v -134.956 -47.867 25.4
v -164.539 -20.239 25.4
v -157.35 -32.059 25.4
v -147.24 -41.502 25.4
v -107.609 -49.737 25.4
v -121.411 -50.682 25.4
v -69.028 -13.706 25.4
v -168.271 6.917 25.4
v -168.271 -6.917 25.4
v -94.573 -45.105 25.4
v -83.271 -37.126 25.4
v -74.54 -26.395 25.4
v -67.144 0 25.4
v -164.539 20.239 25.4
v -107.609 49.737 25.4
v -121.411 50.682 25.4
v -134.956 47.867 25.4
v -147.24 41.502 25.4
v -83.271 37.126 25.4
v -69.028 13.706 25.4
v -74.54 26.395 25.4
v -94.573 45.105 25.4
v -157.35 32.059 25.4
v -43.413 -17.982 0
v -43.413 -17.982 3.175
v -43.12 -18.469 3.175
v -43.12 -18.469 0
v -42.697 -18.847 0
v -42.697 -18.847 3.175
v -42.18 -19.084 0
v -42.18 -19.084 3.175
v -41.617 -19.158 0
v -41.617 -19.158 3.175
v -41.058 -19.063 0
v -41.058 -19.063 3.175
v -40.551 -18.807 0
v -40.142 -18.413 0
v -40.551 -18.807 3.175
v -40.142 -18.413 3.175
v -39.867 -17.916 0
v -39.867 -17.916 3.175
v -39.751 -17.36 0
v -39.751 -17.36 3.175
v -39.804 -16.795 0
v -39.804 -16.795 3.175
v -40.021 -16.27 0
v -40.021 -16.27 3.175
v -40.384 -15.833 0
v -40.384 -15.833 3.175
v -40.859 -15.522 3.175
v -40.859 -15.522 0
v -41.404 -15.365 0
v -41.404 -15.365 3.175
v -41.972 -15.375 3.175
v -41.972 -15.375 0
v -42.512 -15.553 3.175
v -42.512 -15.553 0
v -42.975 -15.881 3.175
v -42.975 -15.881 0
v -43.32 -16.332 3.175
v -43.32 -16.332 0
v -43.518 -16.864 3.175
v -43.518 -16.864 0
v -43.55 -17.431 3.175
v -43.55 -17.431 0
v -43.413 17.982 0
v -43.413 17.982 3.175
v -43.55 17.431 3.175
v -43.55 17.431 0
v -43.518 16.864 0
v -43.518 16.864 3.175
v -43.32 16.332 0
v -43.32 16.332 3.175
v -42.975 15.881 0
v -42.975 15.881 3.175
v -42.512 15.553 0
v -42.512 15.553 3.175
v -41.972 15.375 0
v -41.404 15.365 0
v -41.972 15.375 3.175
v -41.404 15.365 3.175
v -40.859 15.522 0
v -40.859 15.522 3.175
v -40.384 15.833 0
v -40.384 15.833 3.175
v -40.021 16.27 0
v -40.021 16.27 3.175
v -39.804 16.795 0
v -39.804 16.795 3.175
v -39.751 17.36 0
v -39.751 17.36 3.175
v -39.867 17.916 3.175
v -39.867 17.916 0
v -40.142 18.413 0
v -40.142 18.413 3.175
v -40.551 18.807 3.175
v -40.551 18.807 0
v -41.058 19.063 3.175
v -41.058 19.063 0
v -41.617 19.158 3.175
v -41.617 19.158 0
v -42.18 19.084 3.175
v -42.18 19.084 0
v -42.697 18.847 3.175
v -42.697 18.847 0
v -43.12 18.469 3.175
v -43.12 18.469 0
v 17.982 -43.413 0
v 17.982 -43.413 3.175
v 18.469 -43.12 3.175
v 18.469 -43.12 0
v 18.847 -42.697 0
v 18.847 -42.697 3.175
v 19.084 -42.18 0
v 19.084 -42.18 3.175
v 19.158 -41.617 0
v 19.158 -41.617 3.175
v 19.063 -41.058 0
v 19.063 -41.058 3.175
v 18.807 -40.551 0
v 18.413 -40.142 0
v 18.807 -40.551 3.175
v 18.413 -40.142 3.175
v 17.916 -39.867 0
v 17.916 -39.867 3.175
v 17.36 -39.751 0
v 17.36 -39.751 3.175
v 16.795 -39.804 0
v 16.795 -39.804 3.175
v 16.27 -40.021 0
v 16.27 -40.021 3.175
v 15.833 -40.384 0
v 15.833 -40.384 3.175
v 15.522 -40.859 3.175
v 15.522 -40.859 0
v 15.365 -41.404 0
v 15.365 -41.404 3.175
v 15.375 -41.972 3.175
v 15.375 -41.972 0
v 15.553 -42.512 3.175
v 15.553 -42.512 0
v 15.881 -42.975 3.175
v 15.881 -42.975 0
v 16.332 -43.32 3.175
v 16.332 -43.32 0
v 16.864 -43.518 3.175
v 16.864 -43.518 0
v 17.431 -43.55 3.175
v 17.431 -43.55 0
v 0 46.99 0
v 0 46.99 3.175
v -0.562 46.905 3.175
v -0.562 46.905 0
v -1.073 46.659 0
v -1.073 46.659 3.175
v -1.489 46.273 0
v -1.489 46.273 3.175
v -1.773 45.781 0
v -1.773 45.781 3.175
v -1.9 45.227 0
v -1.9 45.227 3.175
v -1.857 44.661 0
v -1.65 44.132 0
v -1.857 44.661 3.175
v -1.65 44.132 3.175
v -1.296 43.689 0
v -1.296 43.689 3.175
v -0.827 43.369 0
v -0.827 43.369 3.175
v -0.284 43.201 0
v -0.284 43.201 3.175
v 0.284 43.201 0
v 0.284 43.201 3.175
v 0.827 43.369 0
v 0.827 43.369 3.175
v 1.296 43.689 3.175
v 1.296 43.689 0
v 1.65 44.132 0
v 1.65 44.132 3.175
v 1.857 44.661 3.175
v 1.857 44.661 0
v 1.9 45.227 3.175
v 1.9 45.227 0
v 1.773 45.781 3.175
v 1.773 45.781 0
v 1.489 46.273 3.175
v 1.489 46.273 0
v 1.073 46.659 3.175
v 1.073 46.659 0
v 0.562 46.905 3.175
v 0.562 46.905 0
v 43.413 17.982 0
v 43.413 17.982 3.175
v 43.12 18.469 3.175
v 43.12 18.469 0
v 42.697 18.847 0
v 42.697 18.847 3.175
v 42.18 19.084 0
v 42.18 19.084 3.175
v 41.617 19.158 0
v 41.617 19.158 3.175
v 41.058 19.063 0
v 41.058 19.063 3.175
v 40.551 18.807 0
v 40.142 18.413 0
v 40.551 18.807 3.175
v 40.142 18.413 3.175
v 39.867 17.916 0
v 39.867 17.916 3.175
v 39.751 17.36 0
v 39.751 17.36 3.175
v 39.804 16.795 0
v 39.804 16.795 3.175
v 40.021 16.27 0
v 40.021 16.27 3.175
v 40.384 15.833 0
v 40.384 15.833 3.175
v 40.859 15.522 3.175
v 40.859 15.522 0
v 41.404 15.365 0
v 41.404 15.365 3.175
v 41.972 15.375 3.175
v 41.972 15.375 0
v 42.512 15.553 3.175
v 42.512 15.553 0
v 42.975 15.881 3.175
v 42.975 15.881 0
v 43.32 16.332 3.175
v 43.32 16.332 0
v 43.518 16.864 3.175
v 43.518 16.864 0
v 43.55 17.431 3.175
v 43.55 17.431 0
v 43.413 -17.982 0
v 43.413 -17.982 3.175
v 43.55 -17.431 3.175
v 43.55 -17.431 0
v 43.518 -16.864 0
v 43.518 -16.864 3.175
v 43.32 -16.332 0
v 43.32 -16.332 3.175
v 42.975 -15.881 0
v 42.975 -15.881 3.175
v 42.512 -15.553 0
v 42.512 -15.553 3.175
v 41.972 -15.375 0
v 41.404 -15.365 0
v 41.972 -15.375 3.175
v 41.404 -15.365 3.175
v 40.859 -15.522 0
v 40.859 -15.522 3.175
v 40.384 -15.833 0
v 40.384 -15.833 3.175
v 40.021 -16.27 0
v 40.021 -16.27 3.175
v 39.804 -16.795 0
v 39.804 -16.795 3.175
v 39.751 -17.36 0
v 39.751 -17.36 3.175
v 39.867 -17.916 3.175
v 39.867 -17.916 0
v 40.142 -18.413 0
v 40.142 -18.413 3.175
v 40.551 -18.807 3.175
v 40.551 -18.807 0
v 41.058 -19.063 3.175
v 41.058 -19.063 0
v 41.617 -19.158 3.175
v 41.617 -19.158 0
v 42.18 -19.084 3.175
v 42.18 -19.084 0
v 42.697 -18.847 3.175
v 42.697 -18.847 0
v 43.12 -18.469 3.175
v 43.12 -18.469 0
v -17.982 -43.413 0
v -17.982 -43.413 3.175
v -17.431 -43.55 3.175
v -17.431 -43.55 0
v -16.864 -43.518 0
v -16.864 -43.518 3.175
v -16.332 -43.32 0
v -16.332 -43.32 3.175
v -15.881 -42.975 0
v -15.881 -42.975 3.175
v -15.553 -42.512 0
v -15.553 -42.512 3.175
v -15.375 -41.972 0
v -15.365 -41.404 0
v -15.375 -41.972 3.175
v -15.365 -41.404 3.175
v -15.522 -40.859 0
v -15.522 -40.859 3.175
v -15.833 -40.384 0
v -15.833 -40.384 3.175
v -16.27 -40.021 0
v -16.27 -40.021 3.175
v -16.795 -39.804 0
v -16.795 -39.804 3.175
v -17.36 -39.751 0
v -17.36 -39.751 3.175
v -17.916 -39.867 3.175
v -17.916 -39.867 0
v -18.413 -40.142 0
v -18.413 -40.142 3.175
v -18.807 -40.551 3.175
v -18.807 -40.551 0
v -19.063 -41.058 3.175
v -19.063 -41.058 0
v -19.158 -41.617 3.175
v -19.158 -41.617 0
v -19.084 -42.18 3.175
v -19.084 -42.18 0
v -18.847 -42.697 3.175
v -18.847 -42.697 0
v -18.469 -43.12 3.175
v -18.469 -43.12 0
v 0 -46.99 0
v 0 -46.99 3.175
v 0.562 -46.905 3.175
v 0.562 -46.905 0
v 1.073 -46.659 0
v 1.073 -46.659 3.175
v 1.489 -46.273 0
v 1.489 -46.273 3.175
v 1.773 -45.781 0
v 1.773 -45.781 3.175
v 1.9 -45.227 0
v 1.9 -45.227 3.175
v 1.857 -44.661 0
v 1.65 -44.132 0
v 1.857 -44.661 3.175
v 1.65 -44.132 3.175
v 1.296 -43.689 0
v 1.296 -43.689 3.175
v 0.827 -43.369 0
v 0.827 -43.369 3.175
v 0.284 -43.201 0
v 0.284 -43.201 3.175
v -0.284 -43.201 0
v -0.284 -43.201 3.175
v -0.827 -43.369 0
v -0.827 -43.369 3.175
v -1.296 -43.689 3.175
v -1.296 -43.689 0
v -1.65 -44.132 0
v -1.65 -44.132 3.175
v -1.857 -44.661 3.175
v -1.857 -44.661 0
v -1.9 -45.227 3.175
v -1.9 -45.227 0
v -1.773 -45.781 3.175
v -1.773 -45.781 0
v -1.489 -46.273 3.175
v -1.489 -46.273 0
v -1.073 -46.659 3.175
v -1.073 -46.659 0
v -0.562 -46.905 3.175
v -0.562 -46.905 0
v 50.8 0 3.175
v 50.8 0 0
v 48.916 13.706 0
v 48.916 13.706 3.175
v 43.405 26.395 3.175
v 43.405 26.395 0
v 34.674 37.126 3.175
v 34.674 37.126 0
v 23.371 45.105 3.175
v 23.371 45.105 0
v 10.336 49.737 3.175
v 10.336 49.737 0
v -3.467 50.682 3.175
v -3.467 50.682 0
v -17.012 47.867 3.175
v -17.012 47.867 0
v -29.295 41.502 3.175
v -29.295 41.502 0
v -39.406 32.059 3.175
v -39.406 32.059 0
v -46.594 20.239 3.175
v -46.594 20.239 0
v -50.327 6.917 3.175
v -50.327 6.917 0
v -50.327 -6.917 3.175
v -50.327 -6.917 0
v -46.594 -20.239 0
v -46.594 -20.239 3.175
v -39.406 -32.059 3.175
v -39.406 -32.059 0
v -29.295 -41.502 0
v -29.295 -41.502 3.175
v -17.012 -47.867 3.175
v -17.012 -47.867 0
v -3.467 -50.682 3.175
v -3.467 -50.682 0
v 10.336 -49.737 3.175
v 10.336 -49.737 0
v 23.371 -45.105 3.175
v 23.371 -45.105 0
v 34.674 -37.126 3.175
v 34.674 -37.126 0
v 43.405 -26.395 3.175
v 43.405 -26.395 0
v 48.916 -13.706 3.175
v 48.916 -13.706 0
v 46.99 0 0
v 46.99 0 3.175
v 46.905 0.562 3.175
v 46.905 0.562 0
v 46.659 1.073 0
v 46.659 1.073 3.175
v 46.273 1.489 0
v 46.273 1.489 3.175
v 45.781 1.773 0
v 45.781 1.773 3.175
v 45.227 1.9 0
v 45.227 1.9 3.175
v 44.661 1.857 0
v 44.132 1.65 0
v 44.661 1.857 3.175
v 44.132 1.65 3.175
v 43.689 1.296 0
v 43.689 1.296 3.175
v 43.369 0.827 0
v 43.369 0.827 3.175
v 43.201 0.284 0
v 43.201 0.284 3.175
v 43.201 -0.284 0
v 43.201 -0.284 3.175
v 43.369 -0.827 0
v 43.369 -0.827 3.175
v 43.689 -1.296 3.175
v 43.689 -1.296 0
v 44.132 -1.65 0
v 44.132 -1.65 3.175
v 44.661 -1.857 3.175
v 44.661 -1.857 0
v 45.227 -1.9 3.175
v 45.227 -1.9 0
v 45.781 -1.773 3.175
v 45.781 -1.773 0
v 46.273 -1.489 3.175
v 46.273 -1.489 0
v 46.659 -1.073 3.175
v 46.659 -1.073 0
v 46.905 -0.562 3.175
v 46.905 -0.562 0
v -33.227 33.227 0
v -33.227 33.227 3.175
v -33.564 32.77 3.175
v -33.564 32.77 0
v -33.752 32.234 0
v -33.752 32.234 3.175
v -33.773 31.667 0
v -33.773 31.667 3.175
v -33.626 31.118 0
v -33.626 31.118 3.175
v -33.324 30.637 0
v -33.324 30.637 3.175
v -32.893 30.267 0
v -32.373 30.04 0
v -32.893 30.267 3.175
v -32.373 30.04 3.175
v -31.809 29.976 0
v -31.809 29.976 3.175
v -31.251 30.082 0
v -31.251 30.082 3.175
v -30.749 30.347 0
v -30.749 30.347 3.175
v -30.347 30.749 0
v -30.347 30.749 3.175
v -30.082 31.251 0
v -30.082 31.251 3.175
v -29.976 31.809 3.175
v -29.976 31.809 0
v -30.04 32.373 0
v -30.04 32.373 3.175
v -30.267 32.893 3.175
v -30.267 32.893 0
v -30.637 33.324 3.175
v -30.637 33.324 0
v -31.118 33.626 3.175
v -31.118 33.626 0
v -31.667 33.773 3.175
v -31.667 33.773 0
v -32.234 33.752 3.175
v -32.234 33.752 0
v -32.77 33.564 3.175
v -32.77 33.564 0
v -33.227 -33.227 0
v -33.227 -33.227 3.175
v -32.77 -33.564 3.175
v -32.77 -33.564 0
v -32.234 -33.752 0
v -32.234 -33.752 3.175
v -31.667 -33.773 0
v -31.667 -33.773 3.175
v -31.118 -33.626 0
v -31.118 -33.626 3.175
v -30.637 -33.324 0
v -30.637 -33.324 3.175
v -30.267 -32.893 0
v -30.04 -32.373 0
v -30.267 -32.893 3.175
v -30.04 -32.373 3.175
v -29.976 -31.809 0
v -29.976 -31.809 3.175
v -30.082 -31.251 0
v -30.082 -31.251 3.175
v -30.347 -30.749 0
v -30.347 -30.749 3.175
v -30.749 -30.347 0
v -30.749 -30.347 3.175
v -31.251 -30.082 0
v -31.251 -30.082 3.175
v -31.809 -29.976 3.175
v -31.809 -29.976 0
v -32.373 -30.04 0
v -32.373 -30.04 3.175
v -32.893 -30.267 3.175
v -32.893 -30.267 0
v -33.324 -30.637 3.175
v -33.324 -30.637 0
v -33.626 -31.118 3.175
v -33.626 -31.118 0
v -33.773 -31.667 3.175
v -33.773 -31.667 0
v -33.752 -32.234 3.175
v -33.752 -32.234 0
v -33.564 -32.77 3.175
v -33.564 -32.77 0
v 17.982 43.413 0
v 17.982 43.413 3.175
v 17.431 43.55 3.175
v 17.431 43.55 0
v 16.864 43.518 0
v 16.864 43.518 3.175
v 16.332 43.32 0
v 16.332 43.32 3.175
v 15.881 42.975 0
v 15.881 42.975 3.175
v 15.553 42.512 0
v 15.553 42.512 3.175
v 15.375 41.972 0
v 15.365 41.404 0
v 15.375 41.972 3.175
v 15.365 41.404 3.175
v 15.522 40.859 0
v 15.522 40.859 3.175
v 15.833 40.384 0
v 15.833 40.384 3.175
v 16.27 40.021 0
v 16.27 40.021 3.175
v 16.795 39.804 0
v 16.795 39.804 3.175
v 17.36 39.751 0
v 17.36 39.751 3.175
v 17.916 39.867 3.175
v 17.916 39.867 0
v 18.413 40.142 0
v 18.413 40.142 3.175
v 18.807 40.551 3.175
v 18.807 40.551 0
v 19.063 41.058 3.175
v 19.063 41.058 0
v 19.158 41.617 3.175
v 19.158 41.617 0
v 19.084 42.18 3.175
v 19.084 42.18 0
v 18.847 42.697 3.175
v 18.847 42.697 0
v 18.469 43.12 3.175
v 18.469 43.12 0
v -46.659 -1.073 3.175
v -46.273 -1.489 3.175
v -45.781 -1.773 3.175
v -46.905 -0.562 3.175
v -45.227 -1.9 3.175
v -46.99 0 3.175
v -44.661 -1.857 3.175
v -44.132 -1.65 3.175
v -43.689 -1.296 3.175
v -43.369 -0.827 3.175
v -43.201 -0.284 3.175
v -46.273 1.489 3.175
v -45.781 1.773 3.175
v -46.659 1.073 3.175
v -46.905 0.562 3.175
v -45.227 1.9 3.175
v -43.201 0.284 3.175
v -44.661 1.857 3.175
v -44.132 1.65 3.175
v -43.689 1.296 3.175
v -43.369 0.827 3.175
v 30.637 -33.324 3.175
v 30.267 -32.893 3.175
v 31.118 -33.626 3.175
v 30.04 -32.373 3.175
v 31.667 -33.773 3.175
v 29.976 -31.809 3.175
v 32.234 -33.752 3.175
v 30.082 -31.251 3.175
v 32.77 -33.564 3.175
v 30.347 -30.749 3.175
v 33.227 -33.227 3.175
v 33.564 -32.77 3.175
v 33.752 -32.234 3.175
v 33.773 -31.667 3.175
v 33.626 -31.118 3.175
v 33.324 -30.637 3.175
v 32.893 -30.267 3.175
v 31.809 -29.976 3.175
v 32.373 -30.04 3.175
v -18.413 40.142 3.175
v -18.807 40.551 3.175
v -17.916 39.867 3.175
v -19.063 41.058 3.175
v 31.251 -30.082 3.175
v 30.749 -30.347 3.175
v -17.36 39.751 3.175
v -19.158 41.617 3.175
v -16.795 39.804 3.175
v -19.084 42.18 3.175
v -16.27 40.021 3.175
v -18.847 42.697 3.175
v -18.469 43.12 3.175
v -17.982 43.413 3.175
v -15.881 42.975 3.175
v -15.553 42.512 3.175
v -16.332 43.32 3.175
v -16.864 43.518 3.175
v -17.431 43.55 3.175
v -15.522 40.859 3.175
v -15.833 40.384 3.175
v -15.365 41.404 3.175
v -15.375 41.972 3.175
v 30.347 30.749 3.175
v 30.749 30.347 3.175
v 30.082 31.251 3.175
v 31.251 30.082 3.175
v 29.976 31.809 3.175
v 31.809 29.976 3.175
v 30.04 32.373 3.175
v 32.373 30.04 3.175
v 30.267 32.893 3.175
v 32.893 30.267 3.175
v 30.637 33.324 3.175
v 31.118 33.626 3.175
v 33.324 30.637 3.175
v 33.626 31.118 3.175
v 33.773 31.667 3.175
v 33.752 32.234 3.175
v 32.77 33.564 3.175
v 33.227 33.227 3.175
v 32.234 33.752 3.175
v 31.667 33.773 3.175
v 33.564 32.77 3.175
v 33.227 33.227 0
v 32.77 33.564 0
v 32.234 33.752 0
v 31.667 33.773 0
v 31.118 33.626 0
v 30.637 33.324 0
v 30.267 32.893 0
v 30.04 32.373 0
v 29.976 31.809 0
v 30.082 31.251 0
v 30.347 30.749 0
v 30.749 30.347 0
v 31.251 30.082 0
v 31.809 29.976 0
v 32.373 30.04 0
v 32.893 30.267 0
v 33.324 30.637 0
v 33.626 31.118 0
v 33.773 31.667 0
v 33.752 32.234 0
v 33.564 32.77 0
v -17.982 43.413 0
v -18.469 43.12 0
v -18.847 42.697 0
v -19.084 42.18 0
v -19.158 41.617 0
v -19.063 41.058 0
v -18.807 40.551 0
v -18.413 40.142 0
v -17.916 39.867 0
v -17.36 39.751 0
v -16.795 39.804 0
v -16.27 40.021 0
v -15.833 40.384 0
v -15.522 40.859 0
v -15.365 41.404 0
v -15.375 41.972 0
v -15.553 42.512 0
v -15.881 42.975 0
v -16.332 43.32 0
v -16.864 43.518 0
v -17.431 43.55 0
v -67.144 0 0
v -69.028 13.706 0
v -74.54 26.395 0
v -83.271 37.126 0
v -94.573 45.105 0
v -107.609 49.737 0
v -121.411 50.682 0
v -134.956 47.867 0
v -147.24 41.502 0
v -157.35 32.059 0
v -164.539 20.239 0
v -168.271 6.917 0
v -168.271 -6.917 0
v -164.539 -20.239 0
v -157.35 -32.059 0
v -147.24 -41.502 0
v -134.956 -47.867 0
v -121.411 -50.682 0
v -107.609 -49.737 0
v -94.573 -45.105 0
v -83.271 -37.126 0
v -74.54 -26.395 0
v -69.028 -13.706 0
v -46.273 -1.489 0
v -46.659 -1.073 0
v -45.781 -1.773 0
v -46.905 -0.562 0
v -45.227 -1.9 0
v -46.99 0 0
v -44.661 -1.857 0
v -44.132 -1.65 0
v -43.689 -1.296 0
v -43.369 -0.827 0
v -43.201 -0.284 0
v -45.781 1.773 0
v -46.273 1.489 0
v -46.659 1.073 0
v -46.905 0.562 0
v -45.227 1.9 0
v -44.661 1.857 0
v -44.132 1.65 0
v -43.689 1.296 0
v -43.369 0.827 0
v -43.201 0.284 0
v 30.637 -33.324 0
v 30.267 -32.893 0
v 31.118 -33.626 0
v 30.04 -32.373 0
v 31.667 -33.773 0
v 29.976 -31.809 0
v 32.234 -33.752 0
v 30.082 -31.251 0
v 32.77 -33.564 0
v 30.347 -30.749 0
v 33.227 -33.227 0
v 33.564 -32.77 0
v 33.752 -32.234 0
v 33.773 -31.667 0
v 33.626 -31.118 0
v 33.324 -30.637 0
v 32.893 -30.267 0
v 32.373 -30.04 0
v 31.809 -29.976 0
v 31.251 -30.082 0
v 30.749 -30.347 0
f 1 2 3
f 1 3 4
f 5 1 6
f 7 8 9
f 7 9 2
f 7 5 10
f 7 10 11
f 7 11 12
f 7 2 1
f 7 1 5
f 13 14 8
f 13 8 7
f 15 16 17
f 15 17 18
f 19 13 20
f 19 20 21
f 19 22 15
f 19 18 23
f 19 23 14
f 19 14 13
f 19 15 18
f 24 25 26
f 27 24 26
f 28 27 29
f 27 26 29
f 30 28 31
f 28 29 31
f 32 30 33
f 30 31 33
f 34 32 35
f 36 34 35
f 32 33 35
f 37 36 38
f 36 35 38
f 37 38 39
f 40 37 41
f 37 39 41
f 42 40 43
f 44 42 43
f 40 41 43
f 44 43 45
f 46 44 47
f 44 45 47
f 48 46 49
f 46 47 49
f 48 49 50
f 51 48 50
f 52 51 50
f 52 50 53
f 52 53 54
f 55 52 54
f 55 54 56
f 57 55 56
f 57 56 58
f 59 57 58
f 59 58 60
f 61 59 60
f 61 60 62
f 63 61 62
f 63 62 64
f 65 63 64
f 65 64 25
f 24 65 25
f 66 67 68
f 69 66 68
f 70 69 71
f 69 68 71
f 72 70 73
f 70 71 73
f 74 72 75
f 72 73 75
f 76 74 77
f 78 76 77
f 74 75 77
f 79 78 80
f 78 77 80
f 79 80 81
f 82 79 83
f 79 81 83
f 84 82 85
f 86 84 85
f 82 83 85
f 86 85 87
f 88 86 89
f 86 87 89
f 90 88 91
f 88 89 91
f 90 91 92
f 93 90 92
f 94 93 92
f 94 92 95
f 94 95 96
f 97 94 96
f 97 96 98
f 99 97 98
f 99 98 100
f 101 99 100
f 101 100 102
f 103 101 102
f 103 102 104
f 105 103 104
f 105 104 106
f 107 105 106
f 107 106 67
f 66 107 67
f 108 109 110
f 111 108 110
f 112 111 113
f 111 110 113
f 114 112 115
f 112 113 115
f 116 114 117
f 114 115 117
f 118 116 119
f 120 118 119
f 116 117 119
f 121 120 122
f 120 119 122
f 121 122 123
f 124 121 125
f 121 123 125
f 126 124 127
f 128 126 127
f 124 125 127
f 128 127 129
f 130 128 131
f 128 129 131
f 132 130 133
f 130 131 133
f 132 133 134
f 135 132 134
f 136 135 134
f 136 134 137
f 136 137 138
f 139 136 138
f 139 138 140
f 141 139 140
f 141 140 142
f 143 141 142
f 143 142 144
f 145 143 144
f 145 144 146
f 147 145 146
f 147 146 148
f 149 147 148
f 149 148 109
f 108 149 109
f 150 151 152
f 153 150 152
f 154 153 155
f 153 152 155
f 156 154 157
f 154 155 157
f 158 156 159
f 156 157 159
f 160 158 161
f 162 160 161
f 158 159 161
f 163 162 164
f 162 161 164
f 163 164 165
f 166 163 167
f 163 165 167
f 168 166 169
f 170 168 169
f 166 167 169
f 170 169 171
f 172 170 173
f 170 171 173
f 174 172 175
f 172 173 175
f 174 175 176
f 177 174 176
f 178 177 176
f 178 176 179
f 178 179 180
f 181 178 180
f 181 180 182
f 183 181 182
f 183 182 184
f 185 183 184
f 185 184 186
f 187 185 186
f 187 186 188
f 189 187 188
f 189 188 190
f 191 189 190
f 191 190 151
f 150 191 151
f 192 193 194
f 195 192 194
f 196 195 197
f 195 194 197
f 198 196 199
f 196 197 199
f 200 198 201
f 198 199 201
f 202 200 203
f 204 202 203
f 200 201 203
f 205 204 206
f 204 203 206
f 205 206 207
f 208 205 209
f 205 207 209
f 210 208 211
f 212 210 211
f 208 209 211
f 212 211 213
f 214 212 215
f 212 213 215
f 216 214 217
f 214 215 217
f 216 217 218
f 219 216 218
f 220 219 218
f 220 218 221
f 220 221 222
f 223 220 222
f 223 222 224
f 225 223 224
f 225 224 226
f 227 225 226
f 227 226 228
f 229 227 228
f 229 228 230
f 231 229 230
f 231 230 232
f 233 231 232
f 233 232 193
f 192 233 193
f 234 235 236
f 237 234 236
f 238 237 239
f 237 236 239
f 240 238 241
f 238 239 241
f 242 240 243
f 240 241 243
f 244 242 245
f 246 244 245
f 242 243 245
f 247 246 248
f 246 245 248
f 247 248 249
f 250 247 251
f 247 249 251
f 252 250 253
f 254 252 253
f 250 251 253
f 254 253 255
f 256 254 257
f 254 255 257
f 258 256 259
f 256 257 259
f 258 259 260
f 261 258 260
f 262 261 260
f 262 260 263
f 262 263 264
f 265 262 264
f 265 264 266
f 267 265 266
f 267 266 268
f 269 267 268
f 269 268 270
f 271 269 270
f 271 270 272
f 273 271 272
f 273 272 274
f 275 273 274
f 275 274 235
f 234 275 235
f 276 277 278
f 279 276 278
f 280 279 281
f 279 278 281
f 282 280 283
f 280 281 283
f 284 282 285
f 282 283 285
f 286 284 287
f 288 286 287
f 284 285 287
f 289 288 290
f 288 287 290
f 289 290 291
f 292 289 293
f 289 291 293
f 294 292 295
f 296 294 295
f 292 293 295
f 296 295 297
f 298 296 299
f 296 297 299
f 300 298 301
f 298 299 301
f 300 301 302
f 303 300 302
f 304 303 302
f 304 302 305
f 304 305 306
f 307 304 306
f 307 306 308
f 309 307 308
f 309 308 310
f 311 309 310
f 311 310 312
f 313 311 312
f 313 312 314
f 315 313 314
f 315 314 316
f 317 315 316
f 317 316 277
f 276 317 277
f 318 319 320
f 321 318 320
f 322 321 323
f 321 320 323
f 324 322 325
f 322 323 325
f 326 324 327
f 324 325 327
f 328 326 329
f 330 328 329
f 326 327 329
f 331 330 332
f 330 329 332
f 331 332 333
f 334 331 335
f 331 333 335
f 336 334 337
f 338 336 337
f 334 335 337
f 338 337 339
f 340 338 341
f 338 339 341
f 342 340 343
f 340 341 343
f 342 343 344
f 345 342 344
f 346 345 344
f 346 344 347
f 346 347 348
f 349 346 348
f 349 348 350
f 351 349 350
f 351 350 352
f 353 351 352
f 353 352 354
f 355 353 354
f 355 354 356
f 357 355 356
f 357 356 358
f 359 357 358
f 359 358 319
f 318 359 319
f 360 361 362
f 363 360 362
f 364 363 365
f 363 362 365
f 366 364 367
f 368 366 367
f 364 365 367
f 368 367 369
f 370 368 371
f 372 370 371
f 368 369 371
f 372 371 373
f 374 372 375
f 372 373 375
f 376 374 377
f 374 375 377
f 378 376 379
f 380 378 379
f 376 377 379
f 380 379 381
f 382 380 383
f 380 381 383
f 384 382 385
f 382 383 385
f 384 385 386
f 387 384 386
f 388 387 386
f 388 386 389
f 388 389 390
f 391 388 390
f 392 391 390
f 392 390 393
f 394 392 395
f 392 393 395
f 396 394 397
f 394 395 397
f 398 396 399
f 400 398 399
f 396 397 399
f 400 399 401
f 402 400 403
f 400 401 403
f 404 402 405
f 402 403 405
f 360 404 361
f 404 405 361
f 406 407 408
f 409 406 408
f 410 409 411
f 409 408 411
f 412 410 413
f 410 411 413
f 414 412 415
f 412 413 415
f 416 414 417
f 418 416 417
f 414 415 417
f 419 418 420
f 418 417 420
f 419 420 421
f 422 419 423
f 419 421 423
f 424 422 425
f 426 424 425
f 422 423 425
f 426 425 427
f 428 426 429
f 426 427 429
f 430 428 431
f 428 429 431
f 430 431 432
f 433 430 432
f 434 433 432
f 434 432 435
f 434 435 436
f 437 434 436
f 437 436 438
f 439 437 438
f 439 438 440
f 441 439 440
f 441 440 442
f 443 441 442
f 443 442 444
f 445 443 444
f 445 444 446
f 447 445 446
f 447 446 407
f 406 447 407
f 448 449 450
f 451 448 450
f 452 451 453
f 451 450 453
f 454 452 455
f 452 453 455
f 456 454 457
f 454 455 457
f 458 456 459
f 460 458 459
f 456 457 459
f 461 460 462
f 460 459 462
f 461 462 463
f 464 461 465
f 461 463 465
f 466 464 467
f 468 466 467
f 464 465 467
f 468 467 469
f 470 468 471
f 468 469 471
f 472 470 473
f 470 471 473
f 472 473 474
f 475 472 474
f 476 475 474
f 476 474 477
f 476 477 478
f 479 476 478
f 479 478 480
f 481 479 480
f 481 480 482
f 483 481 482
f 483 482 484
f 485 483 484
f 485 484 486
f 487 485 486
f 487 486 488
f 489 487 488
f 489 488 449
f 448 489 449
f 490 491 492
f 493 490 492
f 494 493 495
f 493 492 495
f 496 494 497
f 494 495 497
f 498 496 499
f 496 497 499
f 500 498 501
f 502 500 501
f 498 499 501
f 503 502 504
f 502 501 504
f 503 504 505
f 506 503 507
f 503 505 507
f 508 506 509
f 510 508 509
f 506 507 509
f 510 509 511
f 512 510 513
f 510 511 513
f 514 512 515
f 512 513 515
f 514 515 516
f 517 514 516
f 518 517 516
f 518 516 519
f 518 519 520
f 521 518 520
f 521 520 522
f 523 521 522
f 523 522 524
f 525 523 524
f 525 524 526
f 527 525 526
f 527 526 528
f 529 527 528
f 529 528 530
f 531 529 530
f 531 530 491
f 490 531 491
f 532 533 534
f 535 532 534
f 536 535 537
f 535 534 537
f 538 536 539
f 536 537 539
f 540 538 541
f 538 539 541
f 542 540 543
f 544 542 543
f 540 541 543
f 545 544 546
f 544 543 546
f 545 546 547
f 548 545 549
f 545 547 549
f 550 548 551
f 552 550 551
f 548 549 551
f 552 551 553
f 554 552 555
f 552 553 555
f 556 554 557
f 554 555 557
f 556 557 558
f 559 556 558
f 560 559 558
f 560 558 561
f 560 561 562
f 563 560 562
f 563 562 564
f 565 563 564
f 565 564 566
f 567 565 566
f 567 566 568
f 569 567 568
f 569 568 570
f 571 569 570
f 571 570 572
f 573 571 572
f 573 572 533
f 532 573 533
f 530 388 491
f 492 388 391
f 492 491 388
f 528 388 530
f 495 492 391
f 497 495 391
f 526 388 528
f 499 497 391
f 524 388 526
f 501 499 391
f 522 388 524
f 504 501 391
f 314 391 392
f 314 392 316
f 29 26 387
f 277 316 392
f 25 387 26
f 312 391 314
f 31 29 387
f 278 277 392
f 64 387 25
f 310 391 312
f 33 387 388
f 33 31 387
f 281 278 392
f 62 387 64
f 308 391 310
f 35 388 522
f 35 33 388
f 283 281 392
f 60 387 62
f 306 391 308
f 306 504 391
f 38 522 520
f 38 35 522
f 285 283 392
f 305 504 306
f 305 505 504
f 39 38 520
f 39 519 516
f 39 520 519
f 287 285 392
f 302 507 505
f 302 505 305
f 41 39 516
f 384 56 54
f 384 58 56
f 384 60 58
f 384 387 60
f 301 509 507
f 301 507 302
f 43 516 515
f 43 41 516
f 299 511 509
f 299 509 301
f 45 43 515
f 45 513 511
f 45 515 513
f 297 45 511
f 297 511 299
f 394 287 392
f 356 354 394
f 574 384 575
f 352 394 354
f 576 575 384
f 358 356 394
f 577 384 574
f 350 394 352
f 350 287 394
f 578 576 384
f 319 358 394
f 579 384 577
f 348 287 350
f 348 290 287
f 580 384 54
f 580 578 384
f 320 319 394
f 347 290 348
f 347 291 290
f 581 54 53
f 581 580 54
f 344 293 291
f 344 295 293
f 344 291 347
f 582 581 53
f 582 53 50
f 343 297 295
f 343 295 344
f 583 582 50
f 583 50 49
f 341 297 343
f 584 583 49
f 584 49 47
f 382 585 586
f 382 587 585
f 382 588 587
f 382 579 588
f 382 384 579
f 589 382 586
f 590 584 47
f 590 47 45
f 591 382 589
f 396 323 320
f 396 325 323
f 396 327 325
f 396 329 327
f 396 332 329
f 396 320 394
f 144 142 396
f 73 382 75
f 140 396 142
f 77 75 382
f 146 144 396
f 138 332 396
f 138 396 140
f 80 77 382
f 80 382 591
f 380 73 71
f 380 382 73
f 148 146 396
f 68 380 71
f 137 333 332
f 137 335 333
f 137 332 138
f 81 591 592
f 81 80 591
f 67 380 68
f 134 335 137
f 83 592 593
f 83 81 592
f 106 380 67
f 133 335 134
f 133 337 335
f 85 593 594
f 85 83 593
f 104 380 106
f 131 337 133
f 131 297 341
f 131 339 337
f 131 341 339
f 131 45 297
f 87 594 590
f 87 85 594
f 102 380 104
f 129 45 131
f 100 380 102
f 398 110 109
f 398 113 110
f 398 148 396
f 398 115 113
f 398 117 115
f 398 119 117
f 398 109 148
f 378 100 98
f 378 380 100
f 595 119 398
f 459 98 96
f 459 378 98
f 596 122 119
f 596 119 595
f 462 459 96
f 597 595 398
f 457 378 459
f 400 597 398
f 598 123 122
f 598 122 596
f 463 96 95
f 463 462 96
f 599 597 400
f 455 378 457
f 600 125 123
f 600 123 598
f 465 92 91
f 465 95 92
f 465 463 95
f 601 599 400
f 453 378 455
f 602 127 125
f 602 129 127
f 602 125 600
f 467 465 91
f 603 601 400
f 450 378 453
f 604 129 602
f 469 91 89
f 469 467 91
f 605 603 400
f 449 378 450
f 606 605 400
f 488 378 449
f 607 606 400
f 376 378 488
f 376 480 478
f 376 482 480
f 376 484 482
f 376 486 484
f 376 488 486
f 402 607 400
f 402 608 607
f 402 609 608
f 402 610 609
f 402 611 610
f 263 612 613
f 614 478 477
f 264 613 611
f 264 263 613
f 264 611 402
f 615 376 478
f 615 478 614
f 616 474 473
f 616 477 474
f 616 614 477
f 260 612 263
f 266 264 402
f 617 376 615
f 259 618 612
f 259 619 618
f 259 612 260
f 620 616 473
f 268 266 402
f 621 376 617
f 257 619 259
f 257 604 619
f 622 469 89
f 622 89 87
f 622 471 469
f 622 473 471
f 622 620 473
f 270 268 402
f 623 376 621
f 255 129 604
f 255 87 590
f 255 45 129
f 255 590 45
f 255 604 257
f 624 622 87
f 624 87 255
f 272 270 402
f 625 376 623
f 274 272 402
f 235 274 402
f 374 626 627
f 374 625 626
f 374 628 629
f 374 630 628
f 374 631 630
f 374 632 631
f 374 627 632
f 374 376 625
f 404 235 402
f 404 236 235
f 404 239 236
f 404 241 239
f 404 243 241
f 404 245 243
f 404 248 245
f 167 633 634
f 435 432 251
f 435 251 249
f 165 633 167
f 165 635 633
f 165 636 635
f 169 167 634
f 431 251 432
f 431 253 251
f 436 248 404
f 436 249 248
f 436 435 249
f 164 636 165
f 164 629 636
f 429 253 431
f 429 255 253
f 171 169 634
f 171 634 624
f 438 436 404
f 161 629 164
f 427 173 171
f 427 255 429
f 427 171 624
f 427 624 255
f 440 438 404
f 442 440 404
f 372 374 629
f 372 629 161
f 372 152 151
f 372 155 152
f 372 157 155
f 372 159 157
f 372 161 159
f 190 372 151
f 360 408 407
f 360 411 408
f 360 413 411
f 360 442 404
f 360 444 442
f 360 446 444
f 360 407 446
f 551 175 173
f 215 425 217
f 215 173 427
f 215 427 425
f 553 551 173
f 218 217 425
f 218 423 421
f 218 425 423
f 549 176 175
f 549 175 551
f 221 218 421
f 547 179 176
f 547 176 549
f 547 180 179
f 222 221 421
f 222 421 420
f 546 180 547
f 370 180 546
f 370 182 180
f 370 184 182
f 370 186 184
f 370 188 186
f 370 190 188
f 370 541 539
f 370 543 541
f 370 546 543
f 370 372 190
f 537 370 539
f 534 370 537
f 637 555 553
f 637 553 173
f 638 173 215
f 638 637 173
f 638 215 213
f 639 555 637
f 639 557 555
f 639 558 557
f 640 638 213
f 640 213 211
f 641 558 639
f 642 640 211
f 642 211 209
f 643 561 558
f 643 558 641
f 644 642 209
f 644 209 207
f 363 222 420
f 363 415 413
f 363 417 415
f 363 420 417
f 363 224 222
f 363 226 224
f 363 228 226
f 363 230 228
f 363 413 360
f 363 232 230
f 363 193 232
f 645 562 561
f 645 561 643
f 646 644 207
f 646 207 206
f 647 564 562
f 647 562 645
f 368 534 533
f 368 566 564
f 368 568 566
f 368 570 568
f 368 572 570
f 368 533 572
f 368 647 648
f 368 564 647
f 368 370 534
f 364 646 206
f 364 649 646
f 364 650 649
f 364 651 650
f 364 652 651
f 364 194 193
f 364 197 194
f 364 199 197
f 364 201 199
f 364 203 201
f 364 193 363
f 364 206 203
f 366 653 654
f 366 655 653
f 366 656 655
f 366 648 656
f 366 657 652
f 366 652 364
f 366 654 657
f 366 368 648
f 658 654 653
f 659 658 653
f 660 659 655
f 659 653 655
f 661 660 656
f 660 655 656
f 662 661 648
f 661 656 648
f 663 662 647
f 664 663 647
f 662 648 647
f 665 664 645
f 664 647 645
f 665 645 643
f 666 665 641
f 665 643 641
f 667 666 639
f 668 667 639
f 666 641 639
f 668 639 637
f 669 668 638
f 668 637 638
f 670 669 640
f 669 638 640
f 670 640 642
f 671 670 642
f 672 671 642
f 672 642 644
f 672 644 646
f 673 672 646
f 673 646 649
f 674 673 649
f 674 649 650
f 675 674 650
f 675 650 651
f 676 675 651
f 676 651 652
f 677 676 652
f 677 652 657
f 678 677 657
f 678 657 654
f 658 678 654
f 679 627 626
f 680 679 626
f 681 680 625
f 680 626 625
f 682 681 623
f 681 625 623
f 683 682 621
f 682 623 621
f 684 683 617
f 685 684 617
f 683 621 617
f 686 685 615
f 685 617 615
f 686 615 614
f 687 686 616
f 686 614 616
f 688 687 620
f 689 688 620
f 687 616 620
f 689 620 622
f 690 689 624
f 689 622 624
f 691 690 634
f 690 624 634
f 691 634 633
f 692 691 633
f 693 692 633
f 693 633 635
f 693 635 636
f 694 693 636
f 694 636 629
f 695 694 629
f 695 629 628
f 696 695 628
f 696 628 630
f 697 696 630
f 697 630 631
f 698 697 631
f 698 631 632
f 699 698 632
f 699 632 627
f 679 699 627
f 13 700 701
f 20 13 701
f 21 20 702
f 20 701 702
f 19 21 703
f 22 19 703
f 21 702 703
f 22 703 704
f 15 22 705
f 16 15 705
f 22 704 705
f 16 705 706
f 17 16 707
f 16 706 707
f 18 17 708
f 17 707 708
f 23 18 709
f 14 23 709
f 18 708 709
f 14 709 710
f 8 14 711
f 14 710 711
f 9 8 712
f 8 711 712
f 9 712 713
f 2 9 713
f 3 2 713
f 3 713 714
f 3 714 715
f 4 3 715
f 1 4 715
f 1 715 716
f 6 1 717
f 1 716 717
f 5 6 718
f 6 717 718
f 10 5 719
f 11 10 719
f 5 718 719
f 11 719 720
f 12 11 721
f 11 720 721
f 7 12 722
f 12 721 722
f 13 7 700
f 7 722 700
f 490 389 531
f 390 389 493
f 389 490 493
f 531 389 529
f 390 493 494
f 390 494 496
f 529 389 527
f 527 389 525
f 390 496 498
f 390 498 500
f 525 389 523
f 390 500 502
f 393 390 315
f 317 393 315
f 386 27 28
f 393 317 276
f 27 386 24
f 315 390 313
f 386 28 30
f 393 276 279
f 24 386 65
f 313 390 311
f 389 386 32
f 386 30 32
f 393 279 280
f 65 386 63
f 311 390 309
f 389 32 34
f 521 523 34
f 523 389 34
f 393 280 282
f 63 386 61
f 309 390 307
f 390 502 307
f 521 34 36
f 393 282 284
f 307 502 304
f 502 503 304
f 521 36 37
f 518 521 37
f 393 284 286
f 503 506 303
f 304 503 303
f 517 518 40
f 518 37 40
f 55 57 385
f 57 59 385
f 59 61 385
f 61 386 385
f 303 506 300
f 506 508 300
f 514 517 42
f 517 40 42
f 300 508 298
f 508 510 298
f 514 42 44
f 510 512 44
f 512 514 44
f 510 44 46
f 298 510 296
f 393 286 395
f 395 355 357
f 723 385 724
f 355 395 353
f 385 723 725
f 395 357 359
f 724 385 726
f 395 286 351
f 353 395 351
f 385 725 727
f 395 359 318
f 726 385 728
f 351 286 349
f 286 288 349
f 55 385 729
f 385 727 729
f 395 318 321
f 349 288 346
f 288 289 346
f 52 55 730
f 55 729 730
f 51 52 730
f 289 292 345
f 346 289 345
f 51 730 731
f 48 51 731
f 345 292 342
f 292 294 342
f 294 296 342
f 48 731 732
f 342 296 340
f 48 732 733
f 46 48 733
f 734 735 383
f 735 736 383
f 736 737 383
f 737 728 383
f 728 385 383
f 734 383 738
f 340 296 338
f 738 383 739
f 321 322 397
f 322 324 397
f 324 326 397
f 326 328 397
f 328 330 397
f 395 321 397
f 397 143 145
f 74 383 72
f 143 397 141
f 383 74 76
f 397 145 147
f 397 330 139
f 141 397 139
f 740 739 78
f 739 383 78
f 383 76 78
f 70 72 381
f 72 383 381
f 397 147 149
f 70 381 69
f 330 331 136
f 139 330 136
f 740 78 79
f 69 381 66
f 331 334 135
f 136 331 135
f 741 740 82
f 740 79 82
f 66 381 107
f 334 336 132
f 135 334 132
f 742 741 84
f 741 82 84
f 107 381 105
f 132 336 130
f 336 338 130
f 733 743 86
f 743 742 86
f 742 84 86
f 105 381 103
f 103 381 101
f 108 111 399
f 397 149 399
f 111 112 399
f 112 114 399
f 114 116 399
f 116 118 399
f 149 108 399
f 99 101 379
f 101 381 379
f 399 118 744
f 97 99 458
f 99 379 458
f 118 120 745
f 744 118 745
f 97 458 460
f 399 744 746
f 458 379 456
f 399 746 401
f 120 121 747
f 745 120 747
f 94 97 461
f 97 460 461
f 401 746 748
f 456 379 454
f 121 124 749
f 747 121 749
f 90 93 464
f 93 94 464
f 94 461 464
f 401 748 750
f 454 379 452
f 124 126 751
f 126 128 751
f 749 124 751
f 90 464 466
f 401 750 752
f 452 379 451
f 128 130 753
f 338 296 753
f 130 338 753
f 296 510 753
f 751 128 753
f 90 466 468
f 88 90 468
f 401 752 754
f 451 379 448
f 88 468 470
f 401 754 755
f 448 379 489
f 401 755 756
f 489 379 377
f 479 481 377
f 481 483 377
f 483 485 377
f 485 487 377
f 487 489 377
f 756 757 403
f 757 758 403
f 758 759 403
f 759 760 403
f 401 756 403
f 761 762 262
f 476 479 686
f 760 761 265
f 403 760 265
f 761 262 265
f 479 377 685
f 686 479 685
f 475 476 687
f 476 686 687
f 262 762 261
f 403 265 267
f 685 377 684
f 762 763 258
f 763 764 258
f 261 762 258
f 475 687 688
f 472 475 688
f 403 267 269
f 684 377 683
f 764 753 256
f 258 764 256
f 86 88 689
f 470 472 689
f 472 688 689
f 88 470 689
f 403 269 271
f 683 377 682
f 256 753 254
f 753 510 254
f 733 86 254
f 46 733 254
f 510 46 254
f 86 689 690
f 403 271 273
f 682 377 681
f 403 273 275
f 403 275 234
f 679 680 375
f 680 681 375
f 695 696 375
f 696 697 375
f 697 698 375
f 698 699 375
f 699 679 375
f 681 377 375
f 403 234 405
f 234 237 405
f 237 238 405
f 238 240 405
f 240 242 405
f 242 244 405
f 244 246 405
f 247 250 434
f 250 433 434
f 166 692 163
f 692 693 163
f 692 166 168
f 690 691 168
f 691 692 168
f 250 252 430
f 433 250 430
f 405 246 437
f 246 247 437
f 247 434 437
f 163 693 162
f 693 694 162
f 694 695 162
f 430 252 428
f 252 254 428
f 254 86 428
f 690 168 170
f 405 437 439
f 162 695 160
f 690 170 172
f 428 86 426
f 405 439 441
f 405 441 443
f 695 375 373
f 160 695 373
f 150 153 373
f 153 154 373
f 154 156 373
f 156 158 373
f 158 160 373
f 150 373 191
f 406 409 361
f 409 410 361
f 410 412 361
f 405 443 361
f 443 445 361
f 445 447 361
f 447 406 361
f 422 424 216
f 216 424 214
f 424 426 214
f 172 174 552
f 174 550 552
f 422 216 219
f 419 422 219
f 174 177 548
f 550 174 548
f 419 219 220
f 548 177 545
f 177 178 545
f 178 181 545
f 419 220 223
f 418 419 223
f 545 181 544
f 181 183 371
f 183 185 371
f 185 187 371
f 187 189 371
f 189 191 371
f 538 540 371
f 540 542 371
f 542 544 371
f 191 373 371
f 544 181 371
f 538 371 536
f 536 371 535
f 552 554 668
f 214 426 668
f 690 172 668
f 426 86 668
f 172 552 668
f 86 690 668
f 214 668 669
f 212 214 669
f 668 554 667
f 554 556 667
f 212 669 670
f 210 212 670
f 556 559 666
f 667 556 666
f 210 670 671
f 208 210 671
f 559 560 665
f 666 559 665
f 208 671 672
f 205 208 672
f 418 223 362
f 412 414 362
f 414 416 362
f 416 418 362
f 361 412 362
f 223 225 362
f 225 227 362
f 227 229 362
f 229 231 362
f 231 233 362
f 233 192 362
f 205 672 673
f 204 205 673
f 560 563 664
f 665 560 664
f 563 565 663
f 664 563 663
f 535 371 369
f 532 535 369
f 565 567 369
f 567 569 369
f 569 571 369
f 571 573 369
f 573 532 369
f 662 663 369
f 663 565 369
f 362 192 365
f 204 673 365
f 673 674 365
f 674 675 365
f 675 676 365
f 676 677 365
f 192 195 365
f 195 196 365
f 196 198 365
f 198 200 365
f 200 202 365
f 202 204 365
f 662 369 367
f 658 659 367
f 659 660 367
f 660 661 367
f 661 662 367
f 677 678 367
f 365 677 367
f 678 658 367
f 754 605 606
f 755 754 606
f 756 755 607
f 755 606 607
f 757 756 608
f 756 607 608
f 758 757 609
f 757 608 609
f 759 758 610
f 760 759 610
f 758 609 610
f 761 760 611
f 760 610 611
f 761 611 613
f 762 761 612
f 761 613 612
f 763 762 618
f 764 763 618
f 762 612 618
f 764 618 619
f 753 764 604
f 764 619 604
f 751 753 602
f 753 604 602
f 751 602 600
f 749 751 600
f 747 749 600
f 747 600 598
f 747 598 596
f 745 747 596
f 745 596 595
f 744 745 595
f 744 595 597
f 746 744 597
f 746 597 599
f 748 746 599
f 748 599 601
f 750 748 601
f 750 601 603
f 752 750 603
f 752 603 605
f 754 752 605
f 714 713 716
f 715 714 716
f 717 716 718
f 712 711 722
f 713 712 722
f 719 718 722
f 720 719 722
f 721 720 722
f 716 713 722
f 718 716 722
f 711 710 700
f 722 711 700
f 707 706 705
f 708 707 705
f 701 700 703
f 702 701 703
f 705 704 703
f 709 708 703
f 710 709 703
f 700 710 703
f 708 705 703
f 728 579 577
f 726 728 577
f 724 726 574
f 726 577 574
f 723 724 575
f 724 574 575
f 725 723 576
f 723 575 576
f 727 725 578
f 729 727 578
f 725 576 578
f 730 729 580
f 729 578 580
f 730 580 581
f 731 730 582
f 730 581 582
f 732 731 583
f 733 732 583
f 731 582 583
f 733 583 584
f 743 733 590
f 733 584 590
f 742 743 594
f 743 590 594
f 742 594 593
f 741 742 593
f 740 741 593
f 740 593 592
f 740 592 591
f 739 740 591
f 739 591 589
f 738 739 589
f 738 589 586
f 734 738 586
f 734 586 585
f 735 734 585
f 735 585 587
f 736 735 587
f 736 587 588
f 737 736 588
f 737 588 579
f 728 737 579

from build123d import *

# Parameters (mm, degrees)
F0_R            = 50.8
F1_DEPTH        = 3.175
F2_R            = 1.905
F3_DEPTH        = 25.4
F3_COPIES_COUNT = 16
F4_R            = 50.8
F5_DEPTH        = 25.4


# Not quite as in the source:
# - a pattern or mirror of a feature is missing from the dataset's text; its kind, count and spacing are read off the source's solid


with BuildPart() as f1:
    # F0 (on Top) → F1 (new body)
    with BuildSketch(Plane.XY):
        Circle(F0_R)
    extrude(amount=F1_DEPTH)

    # F2 (on face) → F3 (cut)
    with BuildSketch(Plane.XY.offset(3.175)):
        with Locations((45.085, 0)):
            Circle(F2_R)
    f3 = extrude(amount=-F3_DEPTH, mode=Mode.SUBTRACT)

    # F3_copies: F3 ×16 about axis
    f3_copies_axis = Axis((0, 0, 0), (0, 0, 1))
    for i in range(1, F3_COPIES_COUNT):
        add(f3.rotate(f3_copies_axis, i * 360 / F3_COPIES_COUNT), mode=Mode.SUBTRACT)


with BuildPart() as f5:
    # F4 (on Top) → F5 (new body)
    with BuildSketch(Plane.XY):
        with Locations((-117.9443001747, 0)):
            Circle(F4_R)
    extrude(amount=F5_DEPTH)


solid = Compound([f1.part, f5.part])
